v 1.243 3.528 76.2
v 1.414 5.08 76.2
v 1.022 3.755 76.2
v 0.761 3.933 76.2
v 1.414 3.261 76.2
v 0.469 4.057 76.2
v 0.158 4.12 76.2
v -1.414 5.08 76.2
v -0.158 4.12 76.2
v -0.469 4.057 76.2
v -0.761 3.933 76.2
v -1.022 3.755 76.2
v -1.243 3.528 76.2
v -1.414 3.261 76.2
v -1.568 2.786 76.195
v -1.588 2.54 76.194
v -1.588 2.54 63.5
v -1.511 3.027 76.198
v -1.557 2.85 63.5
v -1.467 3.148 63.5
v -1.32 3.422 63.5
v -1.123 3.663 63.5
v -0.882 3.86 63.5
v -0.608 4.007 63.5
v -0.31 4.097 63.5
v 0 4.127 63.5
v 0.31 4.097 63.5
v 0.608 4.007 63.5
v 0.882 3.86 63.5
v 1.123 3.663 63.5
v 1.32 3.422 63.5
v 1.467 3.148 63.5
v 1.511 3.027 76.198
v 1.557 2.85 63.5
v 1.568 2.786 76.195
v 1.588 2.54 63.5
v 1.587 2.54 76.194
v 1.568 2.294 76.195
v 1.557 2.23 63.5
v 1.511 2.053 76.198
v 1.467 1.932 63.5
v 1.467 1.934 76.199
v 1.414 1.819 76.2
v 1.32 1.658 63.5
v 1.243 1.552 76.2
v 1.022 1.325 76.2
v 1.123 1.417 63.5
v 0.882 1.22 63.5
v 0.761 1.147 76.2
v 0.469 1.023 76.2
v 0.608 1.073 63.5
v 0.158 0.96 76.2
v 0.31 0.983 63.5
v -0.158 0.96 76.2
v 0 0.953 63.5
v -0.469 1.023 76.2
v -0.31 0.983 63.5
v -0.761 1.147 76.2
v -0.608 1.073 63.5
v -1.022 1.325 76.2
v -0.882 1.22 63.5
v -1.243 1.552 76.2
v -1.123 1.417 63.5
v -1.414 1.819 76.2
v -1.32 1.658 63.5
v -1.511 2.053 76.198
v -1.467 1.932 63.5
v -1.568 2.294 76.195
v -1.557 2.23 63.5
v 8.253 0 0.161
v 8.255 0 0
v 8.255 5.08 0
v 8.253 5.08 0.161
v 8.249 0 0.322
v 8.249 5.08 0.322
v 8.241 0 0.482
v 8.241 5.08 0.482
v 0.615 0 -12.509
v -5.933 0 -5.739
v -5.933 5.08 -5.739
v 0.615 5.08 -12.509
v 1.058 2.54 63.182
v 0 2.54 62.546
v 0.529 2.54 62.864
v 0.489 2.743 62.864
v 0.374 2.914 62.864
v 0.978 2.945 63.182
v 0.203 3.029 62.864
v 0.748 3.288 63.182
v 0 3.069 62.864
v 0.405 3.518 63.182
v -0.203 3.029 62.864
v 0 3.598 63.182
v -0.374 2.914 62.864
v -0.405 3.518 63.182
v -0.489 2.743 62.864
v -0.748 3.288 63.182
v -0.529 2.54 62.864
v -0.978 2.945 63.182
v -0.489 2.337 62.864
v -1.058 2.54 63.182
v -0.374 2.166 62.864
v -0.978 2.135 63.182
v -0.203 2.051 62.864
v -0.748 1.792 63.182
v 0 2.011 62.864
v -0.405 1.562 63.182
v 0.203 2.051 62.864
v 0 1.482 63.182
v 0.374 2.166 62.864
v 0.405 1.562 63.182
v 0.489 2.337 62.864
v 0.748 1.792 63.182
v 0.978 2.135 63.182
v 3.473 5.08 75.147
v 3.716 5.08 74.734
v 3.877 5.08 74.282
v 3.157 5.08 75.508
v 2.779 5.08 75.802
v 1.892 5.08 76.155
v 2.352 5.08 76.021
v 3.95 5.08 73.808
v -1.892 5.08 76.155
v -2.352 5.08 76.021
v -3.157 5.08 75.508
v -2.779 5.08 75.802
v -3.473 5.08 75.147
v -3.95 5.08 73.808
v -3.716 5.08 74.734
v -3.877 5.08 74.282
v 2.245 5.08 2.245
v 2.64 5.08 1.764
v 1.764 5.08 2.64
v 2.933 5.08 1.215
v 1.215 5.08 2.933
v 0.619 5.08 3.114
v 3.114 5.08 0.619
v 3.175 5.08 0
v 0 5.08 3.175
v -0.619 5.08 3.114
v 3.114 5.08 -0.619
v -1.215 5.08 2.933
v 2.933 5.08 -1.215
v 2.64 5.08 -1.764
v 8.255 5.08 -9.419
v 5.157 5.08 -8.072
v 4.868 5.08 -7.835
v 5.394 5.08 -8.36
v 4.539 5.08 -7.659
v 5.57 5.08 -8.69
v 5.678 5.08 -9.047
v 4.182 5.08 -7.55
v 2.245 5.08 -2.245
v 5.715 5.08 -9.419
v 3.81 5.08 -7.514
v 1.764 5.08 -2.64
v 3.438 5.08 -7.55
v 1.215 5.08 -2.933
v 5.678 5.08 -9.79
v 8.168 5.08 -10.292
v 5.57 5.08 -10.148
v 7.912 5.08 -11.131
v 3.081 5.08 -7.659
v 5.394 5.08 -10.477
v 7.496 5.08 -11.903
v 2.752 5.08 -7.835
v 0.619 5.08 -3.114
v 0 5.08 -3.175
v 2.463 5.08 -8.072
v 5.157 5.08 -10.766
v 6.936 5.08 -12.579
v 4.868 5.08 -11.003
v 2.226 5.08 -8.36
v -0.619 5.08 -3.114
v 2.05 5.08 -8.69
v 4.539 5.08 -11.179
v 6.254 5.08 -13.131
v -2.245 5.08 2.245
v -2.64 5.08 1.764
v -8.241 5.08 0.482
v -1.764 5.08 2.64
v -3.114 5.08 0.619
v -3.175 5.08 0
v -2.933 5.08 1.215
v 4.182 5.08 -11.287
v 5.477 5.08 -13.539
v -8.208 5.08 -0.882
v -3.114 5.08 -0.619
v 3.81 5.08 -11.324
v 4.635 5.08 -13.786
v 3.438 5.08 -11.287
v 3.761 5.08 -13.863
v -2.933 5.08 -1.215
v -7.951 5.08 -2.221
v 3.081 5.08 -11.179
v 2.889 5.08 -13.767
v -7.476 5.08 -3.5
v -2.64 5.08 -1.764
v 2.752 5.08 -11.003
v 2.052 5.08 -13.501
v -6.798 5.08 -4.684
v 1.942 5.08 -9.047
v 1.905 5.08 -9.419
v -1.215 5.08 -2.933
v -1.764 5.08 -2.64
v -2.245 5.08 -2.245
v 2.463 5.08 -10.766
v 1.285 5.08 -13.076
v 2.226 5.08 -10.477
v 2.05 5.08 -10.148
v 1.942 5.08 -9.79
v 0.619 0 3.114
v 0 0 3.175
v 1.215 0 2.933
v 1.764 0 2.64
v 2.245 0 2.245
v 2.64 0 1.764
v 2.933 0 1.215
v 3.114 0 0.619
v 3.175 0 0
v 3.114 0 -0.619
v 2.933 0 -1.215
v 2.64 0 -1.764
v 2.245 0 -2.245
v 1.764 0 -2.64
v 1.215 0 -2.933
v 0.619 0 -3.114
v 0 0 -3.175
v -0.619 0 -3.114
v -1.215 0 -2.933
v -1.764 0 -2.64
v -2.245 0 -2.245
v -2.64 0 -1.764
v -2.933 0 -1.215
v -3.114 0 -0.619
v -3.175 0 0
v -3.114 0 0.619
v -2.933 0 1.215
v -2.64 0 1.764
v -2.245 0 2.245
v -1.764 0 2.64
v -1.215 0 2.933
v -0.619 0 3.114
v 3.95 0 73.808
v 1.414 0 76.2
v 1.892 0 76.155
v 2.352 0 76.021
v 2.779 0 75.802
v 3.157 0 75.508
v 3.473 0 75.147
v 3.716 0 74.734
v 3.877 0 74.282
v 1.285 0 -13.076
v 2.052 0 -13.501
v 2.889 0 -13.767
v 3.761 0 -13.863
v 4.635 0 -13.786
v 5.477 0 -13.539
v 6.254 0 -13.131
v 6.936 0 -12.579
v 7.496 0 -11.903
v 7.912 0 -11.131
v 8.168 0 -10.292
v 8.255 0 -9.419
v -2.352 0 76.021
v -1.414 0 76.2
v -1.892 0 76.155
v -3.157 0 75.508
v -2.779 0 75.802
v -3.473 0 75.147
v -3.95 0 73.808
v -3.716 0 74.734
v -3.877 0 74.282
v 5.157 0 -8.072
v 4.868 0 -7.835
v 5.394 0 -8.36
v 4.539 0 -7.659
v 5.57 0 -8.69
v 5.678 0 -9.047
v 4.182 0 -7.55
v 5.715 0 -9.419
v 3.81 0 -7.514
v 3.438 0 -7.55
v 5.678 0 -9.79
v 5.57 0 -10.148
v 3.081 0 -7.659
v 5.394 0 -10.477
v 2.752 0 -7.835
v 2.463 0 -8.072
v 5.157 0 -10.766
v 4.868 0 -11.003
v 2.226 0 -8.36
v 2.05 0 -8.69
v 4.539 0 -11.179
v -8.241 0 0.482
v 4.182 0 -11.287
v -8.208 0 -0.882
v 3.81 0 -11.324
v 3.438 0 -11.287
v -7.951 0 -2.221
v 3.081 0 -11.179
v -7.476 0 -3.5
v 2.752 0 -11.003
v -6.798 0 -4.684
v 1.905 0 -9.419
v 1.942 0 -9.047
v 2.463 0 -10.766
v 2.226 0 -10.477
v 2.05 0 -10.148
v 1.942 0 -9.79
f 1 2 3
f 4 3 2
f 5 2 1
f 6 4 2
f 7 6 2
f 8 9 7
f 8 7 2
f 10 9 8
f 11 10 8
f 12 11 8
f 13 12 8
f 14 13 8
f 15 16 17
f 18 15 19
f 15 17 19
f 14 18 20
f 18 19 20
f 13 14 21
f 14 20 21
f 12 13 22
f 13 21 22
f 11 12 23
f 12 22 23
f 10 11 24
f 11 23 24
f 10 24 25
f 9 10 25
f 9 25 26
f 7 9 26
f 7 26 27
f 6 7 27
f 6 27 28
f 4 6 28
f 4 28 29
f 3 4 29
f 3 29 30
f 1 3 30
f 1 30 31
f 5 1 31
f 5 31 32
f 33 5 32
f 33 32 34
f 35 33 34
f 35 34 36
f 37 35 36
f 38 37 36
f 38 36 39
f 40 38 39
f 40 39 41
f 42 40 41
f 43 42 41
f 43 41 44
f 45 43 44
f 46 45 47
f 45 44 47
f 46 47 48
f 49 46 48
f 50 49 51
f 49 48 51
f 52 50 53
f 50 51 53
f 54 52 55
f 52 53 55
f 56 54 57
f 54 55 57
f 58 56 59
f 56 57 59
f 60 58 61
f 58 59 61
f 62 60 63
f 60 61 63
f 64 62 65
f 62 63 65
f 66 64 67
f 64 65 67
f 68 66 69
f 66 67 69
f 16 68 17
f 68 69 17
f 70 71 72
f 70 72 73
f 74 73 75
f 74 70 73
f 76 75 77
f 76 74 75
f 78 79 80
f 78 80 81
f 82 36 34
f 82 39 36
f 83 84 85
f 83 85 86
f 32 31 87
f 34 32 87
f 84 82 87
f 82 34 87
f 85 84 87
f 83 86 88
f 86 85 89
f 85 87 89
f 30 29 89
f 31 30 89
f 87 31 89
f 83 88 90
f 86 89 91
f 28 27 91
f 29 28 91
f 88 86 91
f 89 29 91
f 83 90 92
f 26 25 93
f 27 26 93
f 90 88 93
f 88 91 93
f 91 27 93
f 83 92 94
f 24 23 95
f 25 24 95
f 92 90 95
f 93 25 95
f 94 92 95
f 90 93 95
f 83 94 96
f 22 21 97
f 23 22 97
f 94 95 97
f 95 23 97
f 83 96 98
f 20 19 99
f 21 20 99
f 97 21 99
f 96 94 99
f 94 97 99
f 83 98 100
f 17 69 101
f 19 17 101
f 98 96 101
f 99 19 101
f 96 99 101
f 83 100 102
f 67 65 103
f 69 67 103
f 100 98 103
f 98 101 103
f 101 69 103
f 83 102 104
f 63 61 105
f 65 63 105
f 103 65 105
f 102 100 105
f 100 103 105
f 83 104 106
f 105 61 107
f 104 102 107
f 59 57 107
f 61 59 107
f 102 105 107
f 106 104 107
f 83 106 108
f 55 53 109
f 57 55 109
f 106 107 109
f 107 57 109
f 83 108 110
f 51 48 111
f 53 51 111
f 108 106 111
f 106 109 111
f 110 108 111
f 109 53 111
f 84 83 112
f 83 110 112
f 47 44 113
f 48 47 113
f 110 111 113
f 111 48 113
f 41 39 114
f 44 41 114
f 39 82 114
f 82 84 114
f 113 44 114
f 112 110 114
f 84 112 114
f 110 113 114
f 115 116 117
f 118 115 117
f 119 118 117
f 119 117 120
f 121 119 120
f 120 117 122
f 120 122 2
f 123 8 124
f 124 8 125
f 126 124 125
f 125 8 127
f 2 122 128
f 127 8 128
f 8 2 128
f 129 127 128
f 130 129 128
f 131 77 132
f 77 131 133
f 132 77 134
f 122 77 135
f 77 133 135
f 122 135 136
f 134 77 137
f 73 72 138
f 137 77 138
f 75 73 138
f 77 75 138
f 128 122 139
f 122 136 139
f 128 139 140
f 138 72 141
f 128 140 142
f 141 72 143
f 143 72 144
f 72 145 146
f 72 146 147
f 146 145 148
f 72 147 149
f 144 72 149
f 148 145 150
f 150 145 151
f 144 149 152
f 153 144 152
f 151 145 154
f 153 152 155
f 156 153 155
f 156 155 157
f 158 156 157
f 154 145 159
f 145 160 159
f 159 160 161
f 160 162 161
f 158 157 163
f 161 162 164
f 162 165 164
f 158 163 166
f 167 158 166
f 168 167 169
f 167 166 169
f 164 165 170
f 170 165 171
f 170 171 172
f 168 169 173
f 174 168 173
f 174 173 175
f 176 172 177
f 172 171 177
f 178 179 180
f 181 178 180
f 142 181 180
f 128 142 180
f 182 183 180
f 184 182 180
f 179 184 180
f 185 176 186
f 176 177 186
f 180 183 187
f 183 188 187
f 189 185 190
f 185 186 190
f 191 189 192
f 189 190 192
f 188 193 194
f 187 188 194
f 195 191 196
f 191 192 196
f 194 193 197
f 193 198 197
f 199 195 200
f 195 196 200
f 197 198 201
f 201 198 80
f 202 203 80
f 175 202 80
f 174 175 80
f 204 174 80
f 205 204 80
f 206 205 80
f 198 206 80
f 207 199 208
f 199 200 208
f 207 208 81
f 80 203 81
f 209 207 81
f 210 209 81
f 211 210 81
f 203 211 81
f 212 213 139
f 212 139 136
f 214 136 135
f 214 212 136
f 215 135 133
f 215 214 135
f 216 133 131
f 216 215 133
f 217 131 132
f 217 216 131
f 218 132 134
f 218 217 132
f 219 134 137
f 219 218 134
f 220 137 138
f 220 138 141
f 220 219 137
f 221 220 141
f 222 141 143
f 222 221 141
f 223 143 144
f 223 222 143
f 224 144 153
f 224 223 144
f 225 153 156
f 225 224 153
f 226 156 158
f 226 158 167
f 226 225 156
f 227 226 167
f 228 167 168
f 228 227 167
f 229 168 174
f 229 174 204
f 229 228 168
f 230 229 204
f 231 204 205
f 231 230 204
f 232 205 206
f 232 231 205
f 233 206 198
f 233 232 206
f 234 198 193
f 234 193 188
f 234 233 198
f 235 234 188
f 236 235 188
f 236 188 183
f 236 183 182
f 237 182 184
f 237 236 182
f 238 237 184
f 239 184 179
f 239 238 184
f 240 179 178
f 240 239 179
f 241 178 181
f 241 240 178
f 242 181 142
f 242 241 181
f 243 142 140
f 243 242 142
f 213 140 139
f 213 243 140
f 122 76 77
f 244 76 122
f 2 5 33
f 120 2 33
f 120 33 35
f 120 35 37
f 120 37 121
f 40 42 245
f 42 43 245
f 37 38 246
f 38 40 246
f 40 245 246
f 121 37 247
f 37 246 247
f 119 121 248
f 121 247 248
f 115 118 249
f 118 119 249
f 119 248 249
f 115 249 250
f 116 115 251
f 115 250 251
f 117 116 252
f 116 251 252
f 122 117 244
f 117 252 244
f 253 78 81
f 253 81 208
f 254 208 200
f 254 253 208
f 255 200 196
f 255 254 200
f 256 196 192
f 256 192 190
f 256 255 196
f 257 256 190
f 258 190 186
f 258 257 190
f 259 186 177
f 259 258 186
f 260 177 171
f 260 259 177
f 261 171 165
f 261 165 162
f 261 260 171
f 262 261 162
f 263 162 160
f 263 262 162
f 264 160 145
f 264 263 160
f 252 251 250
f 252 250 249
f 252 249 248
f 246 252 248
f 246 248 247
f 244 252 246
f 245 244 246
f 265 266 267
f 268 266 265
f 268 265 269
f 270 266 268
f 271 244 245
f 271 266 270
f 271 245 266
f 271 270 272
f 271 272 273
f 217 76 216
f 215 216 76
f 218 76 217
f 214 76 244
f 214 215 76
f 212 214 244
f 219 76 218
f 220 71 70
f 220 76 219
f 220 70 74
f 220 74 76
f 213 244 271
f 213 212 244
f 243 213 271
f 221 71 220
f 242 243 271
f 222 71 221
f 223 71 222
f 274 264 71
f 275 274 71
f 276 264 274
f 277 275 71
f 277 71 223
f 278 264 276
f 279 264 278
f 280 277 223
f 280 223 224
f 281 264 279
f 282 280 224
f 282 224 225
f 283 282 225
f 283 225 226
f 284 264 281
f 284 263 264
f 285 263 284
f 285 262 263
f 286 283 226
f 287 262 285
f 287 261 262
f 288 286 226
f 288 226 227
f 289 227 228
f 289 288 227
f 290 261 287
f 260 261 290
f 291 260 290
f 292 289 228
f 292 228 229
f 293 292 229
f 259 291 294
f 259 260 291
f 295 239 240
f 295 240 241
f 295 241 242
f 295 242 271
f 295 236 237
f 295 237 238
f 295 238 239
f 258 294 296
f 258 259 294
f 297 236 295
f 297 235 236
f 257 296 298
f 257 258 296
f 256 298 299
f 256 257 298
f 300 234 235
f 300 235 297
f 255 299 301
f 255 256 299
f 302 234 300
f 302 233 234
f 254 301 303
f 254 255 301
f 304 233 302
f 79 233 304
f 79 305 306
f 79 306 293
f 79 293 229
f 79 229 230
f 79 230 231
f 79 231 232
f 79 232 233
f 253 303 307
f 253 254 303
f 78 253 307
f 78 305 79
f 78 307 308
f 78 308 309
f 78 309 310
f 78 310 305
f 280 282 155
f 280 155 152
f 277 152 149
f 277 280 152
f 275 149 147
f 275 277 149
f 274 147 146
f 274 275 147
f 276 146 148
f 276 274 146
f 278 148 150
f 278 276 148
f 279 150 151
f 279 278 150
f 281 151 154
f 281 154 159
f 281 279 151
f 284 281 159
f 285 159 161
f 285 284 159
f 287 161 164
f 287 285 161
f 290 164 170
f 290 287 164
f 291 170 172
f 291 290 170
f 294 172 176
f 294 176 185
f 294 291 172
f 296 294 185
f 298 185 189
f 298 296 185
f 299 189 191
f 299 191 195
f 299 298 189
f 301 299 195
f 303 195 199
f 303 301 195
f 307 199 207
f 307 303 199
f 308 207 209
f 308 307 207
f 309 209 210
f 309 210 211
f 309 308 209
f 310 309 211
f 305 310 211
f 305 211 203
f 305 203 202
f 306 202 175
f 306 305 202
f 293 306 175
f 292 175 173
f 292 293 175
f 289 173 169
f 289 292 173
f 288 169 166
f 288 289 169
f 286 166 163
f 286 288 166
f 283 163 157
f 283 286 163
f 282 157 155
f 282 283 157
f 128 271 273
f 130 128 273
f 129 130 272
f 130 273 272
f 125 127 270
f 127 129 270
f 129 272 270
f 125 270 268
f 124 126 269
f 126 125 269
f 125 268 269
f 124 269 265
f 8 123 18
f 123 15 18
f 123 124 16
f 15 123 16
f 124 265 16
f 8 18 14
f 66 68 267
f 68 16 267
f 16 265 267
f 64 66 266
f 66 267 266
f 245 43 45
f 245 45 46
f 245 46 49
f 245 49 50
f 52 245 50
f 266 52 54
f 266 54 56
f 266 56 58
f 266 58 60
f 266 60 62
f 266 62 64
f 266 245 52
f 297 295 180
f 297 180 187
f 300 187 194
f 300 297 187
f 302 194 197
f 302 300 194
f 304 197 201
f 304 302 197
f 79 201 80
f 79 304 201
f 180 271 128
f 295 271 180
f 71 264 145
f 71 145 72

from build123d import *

# Parameters (mm, degrees)
SKETCH1_R                        = 3.175
SKETCH1_R_2                      = 1.905
BOSS_EXTRUDE1_DEPTH              = 5.08
F_1_8_0_125_DIAMETER_HOLE1_D     = 3.175
F_1_8_0_125_DIAMETER_HOLE1_DEPTH = 12.7
F_1_8_0_125_DIAMETER_HOLE1_TIP   = 0.953866233
FILLET1_R                        = 2.54


with BuildPart() as part:
    # Sketch1 → Boss-Extrude1 (new body)
    with BuildSketch(Plane(origin=(0, 0, 0), x_dir=(1, 0, 0), z_dir=(0, 1, 0))):
        with BuildLine():
            Line((-5.93328125, 5.73944236), (0.61515625, 12.509041042))
            ThreePointArc((0.61515625, 12.509041042), (5.476875, 13.539197363), (8.255, 9.418572079))
            Line((8.255, 9.418572079), (8.255, 0))
            ThreePointArc((8.255, 0), (8.251474709, -0.241226303), (8.240901846, -0.482246574))
            Line((8.240901846, -0.482246574), (3.81, -76.2))
            Line((3.81, -76.2), (-3.81, -76.2))
            Line((-3.81, -76.2), (-8.240901846, -0.482246574))
            ThreePointArc((-8.240901846, -0.482246574), (-7.739781645, 2.870680248), (-5.93328125, 5.73944236))
        make_face()
        with Locations(Location((0, 0, 0), (0, 0, 270))):
            Circle(SKETCH1_R, mode=Mode.SUBTRACT)
        with Locations(Location((3.81, 9.418572079, 0), (0, 0, 270))):
            Circle(SKETCH1_R_2, mode=Mode.SUBTRACT)
    extrude(amount=BOSS_EXTRUDE1_DEPTH)

    # 1/8 (0.125) Diameter Hole1
    with Locations(Plane.XY.offset(76.2)):
        with Locations((0, 2.54)):
            Hole(F_1_8_0_125_DIAMETER_HOLE1_D / 2, depth=F_1_8_0_125_DIAMETER_HOLE1_DEPTH)
            with Locations((0, 0, -(F_1_8_0_125_DIAMETER_HOLE1_DEPTH + F_1_8_0_125_DIAMETER_HOLE1_TIP / 2))):  # 118° drill point
                Cone(0, F_1_8_0_125_DIAMETER_HOLE1_D / 2, F_1_8_0_125_DIAMETER_HOLE1_TIP, mode=Mode.SUBTRACT)

    # Fillet1
    # the kernel refuses this fillet: 2.54 mm, written as the material it takes off along each edge
    with BuildSketch(Plane(origin=(3.81, -5.989269764, 76.2), x_dir=(0.05841872493617041, 0, -0.9982921679432489), z_dir=(0, 1, 0))) as fillet1_piece_1:
        with BuildLine():
            CenterArc((FILLET1_R * 0.943192088749, FILLET1_R), FILLET1_R, 183.349053141, 86.650946859)
            Line((-FILLET1_R * 0.0551000791946, FILLET1_R * 0.941581275064), (0, 0))
            Line((0, 0), (FILLET1_R * 0.943192088749, 0))
        make_face()
    extrude(amount=17.058539527, mode=Mode.SUBTRACT)
    with BuildSketch(Plane(origin=(-3.81, -5.989269764, 76.2), x_dir=(-0.05841872493617083, 0, -0.9982921679432489), z_dir=(0, 1, 0))) as fillet1_piece_2:
        with BuildLine():
            CenterArc((FILLET1_R * 0.943192088749, -FILLET1_R), FILLET1_R, 90, 86.650946859)
            Line((-FILLET1_R * 0.0551000791946, -FILLET1_R * 0.941581275064), (0, 0))
            Line((0, 0), (FILLET1_R * 0.943192088749, 0))
        make_face()
    extrude(amount=17.058539527, mode=Mode.SUBTRACT)


solid = part.part
